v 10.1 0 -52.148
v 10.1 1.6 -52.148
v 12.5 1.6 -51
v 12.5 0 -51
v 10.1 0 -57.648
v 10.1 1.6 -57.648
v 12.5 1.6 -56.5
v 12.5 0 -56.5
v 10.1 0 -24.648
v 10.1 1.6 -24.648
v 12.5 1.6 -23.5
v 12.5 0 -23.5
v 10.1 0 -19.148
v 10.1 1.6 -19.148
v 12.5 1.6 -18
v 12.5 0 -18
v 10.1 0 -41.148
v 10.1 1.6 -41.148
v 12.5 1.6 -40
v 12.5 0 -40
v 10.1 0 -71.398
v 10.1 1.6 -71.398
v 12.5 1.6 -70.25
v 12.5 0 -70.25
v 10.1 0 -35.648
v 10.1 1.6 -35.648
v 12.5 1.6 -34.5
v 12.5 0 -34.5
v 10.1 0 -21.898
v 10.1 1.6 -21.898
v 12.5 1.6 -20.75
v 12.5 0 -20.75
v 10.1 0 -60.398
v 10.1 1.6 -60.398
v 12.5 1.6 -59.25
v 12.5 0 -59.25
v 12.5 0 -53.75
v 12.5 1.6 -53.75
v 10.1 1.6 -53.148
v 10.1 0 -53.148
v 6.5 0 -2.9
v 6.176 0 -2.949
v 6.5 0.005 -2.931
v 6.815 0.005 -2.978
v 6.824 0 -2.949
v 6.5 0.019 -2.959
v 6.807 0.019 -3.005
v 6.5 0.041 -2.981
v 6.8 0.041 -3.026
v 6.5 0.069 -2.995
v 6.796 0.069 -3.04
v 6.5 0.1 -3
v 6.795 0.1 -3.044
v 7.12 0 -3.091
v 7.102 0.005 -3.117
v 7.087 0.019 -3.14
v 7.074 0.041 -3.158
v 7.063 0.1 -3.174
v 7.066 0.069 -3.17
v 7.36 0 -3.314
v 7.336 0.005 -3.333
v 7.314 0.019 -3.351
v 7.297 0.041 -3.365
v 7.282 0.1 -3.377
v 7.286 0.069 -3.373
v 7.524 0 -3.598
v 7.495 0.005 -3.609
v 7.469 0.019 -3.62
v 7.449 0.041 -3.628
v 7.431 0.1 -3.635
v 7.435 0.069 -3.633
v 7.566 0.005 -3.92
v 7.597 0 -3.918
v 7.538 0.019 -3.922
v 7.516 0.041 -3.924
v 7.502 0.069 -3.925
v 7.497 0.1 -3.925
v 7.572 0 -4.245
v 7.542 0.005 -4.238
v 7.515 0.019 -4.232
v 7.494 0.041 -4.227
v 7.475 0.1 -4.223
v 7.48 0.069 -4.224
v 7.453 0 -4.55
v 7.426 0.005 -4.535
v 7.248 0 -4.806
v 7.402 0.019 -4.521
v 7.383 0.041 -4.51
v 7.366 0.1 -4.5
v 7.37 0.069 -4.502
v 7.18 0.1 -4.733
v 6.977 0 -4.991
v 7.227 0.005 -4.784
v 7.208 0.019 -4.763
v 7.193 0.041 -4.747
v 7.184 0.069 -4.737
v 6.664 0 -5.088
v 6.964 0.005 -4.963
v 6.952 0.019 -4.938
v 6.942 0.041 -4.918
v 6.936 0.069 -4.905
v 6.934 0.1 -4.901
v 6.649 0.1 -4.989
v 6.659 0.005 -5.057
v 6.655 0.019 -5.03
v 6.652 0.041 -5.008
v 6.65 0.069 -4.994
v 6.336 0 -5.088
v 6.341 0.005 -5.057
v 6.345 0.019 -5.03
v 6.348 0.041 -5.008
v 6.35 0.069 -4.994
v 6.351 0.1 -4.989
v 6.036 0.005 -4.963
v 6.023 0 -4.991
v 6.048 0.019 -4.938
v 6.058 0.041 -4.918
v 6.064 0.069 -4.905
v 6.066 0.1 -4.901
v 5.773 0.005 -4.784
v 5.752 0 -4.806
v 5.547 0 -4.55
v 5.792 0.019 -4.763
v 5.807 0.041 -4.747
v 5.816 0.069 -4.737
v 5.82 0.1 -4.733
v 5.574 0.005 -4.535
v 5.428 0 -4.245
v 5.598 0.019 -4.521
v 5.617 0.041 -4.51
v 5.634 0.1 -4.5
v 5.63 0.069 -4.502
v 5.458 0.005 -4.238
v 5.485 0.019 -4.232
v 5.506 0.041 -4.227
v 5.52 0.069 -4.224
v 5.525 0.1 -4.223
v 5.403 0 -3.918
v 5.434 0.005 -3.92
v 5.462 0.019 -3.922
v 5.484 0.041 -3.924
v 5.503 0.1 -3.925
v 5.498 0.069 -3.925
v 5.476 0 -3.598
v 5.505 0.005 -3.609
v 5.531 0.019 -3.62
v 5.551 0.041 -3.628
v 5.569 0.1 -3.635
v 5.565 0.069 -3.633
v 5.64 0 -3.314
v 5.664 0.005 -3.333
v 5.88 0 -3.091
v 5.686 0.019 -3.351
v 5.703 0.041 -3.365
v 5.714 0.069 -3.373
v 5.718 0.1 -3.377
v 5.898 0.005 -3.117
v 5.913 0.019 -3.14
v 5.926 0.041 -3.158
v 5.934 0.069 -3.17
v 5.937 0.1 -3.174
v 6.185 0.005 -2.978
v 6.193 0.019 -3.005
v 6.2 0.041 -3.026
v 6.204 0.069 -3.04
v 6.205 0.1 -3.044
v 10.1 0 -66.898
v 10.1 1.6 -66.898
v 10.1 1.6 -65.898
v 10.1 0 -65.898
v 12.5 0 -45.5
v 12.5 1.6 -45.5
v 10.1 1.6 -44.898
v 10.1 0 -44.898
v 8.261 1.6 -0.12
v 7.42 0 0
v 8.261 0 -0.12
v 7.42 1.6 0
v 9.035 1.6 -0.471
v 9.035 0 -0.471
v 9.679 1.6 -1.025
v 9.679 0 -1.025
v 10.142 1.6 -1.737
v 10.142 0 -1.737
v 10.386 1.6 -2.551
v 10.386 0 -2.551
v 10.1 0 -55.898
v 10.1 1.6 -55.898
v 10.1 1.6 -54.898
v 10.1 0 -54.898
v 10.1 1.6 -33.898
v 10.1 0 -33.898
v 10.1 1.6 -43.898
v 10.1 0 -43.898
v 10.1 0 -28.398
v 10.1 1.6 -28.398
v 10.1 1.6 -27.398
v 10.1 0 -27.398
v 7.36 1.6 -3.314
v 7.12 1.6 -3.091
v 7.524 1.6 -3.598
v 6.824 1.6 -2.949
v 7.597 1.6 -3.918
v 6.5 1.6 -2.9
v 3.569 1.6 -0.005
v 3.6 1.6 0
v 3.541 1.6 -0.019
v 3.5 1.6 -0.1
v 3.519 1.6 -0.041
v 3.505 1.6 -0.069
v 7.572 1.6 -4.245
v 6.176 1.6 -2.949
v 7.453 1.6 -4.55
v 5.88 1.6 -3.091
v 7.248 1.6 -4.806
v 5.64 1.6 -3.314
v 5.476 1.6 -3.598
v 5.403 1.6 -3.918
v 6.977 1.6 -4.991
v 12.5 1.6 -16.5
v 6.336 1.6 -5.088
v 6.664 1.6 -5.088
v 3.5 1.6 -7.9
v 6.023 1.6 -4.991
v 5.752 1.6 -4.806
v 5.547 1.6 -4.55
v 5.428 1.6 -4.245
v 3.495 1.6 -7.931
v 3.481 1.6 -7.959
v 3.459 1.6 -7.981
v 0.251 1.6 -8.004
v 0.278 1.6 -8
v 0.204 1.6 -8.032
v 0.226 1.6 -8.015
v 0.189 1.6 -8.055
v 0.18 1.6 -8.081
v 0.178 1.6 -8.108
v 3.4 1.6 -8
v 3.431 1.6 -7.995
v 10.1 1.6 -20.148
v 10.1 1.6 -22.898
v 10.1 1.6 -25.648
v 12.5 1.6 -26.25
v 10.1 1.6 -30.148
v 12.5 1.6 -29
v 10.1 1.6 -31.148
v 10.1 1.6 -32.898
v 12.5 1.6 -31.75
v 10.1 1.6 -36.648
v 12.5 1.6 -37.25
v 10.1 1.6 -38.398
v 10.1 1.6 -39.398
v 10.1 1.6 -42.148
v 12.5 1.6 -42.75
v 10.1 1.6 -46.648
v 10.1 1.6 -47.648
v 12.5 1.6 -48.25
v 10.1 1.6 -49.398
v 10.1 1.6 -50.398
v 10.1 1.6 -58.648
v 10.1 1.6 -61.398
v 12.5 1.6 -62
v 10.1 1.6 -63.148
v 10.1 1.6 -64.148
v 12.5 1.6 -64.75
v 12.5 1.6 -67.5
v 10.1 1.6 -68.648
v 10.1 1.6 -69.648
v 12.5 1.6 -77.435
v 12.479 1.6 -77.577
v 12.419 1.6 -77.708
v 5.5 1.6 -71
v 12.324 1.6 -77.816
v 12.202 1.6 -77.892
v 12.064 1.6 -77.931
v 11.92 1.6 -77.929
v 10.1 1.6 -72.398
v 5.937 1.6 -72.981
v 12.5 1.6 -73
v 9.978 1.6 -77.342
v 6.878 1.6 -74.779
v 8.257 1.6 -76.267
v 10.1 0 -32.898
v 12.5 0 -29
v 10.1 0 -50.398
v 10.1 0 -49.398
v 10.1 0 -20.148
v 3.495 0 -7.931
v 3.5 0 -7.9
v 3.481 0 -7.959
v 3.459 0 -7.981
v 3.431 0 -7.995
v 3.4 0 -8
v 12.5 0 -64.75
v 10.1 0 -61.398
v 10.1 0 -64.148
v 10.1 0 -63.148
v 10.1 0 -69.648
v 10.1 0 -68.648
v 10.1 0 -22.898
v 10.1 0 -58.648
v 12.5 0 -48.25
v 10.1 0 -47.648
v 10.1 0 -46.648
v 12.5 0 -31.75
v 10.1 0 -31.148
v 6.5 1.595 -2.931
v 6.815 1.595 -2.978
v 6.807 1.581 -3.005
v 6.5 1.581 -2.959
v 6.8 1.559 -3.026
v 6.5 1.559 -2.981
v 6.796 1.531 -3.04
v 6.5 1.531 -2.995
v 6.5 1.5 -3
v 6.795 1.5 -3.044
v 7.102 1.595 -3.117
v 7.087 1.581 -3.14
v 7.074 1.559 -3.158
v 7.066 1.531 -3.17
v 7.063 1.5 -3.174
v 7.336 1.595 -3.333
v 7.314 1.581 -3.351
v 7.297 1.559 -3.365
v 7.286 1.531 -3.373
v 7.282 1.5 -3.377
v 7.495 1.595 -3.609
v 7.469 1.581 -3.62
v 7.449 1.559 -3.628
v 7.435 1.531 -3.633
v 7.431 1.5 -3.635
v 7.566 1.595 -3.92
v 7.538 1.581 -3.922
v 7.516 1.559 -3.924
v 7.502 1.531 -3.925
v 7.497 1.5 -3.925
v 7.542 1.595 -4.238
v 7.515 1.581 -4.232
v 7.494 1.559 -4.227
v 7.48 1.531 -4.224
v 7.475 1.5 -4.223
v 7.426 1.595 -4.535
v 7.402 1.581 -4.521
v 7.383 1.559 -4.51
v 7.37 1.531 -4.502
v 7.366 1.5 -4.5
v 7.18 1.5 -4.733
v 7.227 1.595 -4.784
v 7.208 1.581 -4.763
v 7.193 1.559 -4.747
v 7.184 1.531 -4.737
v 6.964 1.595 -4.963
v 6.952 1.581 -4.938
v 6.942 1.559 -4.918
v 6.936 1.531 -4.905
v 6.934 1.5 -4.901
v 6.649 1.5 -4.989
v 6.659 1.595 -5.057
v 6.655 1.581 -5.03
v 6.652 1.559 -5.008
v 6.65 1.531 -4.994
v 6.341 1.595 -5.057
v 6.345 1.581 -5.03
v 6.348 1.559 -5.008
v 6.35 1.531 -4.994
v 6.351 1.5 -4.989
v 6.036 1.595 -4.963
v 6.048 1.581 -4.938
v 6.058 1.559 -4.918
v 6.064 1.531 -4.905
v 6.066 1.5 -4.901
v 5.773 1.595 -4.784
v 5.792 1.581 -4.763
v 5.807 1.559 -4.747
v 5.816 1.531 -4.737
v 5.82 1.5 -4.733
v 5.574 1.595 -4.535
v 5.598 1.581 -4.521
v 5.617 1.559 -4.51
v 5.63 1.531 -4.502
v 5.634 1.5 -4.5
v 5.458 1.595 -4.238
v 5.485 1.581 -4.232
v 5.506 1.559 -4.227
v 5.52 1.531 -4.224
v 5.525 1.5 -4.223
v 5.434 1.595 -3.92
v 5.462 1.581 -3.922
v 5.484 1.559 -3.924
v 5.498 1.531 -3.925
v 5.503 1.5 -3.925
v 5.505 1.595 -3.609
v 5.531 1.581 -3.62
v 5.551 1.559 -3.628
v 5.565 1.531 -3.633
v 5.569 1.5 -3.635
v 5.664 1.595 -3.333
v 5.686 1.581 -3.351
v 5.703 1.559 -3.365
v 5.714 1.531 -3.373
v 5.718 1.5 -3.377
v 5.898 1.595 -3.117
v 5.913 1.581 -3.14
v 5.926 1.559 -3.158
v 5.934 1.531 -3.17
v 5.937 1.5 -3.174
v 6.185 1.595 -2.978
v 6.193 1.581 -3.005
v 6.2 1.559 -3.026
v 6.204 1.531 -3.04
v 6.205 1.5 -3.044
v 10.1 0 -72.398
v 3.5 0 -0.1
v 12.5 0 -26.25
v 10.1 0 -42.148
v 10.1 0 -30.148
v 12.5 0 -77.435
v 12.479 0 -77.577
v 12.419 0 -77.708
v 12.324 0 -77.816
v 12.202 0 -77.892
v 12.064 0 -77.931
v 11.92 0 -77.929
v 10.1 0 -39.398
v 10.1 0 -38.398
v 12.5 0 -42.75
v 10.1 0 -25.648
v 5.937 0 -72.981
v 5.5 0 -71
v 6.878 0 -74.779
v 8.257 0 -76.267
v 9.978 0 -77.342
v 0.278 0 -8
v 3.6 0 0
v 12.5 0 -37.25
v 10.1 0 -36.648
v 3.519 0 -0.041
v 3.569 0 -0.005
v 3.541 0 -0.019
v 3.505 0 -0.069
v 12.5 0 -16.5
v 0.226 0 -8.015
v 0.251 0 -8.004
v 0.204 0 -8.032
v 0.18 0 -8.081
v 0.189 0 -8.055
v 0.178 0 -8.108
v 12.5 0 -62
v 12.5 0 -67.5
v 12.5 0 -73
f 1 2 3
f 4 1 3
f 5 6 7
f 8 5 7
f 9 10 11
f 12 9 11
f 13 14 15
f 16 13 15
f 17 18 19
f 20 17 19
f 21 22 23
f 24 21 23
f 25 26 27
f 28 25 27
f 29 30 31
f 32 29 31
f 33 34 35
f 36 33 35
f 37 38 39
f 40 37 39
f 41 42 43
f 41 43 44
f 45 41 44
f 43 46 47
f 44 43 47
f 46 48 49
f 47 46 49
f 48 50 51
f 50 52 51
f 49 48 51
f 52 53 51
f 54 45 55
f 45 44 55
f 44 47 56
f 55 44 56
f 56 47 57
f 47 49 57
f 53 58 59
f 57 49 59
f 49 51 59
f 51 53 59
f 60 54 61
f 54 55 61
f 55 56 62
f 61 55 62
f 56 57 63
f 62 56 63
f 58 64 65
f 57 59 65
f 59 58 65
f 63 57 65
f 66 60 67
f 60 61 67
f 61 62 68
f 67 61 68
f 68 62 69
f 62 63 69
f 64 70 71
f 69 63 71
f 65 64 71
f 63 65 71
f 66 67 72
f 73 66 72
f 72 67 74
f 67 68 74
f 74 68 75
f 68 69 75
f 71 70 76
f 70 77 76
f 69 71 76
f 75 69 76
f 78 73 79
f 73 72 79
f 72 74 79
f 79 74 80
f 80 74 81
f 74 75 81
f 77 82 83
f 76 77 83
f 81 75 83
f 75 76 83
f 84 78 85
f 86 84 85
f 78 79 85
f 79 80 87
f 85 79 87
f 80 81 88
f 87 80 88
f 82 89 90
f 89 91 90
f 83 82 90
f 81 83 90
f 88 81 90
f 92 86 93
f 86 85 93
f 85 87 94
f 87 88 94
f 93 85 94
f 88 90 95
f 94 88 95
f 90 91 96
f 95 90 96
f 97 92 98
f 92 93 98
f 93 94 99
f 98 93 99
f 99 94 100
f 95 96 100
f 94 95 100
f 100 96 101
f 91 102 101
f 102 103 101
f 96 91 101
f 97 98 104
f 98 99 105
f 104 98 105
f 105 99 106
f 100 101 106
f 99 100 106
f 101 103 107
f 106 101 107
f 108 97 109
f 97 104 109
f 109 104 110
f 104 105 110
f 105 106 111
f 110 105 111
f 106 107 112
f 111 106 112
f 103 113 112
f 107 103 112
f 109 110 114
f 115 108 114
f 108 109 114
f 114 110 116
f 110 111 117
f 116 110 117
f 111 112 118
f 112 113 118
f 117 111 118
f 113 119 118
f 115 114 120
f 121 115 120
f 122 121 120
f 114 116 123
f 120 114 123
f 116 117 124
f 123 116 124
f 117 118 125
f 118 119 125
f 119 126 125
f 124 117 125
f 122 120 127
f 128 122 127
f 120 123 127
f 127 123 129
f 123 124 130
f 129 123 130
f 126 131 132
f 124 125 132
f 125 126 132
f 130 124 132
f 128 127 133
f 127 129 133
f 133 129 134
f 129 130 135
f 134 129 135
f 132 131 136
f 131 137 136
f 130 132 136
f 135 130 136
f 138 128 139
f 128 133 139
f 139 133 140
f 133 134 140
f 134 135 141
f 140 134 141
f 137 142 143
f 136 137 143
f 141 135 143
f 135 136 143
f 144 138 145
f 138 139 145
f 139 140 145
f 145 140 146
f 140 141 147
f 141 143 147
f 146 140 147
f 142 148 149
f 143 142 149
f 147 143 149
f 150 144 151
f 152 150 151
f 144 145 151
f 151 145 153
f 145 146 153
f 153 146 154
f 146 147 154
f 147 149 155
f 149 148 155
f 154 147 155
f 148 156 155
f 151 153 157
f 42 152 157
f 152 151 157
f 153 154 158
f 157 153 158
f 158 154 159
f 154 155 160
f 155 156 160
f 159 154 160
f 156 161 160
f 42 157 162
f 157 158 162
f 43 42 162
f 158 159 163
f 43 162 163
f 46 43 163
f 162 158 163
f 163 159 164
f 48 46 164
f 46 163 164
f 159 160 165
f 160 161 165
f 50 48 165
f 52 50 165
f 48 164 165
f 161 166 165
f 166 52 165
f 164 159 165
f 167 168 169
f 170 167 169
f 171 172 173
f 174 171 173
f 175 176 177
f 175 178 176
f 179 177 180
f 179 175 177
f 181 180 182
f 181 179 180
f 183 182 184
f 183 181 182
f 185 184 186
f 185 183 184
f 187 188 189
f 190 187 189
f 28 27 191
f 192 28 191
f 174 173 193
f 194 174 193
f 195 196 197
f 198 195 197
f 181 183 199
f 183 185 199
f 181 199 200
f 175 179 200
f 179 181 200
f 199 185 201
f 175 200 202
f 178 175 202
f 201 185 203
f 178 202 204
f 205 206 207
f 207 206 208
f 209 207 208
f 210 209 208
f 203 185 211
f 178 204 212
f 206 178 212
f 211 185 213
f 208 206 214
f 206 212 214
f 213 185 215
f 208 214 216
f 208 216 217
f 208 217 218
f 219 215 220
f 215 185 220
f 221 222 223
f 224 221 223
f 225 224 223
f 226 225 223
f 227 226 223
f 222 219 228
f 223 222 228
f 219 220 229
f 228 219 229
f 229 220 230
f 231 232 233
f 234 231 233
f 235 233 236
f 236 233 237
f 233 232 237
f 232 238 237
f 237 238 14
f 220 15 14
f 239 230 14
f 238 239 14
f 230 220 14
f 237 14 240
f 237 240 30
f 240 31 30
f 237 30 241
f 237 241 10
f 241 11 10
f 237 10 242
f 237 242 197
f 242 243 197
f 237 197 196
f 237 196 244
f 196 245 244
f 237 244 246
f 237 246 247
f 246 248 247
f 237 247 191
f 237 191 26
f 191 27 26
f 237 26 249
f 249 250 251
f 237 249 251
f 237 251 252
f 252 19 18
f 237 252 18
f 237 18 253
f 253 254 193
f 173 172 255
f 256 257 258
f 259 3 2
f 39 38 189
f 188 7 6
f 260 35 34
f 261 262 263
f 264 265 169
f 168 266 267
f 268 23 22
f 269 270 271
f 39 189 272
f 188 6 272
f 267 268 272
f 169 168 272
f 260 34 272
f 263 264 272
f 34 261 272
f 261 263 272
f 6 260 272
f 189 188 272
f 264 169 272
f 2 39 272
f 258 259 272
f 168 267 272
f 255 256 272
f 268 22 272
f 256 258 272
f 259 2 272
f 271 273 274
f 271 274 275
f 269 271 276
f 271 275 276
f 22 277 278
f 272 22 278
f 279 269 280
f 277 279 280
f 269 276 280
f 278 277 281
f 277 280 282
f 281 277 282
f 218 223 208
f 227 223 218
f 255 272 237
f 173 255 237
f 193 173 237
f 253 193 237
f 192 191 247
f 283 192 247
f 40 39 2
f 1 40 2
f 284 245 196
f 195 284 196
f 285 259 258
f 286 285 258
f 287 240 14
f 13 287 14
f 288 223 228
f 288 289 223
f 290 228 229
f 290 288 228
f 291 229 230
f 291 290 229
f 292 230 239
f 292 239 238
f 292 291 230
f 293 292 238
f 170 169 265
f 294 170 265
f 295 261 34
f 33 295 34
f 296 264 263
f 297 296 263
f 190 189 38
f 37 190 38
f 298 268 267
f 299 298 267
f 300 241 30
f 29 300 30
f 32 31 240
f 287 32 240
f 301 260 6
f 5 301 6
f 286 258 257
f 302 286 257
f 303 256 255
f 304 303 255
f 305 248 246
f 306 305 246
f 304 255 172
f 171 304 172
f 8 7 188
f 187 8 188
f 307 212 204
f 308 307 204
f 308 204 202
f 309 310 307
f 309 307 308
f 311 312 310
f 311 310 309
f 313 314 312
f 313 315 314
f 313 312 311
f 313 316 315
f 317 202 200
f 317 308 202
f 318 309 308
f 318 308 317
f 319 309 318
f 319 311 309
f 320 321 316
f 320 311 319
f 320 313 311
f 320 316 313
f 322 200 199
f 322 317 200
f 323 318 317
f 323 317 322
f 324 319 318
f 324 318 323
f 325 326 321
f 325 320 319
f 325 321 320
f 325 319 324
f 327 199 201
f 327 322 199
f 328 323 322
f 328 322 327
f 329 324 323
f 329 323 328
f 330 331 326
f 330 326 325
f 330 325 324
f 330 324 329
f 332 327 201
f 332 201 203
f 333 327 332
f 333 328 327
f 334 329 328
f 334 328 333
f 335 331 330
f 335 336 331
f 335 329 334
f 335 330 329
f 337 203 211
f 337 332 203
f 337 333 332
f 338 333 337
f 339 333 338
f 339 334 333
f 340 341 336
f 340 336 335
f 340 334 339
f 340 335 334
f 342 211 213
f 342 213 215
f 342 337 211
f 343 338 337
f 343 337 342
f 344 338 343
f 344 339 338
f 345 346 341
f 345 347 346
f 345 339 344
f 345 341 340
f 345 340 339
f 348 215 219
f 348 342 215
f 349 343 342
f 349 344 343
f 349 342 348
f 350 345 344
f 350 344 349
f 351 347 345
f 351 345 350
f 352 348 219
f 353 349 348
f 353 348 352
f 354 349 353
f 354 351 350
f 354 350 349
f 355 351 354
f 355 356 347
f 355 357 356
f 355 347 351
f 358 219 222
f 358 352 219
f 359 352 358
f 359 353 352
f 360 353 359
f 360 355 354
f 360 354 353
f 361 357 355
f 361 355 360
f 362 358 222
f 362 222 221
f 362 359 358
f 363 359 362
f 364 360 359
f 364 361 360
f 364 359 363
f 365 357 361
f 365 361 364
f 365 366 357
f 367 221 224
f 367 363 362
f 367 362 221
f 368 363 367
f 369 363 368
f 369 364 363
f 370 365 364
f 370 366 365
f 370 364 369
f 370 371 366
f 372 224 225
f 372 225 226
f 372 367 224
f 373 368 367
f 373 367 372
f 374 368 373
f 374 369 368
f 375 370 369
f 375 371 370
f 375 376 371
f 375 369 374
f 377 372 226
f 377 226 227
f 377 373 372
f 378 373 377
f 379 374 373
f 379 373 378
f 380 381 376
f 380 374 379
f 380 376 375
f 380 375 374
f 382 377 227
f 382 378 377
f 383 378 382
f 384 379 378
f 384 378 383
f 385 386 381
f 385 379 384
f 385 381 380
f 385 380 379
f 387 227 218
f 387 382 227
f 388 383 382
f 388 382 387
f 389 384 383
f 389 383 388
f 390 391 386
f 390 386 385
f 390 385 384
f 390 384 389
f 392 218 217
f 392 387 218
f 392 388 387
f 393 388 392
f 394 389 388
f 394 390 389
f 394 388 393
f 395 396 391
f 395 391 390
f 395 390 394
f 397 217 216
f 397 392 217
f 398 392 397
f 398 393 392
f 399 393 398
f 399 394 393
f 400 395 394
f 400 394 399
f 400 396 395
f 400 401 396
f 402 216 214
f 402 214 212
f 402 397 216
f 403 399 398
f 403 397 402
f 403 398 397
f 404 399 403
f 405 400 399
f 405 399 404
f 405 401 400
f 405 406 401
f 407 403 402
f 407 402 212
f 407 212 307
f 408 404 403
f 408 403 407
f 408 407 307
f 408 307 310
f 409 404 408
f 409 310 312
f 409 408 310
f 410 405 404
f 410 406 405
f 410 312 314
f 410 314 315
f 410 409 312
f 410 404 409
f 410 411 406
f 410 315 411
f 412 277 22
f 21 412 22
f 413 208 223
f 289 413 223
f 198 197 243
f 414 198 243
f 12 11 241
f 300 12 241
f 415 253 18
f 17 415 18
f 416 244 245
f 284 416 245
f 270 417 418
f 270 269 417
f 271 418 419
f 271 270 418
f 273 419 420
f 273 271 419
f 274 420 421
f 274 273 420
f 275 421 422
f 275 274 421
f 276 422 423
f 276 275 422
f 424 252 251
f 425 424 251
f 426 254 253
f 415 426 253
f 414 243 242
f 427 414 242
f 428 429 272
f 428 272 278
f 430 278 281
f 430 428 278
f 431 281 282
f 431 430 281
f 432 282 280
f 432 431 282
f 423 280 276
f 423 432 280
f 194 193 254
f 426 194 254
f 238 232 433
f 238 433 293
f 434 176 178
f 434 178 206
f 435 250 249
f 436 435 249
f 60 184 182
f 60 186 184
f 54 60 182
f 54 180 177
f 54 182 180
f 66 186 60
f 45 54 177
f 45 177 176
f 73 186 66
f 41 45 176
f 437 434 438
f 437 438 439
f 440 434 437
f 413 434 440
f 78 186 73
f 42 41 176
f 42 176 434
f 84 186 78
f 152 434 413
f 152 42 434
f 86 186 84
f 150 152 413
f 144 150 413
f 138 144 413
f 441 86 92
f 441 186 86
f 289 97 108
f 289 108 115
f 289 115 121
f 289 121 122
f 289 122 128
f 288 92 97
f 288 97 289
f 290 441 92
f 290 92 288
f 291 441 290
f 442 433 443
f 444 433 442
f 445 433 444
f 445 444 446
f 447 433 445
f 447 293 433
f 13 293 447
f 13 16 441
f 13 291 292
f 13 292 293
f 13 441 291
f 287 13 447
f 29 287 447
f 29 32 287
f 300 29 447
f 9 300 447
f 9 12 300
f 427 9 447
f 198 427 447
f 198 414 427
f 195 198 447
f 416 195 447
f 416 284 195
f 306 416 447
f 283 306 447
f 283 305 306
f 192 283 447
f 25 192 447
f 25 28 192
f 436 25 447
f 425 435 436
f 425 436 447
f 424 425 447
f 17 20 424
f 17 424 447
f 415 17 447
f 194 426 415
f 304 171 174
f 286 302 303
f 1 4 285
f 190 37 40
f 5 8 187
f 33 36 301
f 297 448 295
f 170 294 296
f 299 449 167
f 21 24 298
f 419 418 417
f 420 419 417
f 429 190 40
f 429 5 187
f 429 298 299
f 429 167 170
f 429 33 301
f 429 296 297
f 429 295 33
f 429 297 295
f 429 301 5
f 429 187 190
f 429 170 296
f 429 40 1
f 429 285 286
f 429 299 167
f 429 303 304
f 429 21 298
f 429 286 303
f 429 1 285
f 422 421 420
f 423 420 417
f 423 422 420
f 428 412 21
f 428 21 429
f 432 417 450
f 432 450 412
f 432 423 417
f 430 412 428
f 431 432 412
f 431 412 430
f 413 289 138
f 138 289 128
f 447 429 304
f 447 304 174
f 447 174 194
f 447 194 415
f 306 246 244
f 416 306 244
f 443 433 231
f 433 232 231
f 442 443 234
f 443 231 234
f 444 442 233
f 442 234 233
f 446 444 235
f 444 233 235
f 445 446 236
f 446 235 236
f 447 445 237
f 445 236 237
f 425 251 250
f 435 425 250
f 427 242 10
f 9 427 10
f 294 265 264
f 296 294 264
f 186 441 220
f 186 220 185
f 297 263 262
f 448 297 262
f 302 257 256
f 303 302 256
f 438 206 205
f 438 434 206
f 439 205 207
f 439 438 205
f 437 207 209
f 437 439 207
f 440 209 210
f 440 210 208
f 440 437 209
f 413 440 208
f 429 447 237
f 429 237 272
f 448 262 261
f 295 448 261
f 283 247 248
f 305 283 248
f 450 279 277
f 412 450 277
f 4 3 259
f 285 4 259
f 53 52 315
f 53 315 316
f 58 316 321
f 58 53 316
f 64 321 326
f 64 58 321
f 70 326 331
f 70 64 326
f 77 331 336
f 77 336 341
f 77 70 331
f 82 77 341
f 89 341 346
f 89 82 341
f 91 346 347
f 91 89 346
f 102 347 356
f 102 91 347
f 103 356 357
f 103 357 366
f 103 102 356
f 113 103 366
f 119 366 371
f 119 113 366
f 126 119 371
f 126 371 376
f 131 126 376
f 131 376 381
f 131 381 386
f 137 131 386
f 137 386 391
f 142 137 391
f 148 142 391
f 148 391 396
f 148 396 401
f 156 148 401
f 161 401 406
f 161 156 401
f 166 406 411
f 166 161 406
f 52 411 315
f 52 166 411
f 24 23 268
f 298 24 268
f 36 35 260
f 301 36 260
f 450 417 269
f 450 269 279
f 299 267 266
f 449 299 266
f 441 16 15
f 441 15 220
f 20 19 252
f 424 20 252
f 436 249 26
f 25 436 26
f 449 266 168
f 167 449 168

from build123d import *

# Parameters (mm, degrees)
SKETCH1_R           = 1
BOSS_EXTRUDE2_DEPTH = 1.6
SKETCH3_W           = 3.5
SKETCH3_H           = 8
CUT_EXTRUDE2_DEPTH  = 80.011454866
FILLET2_R           = 3
FILLET3_R           = 0.1
FILLET4_R           = 0.1
CUT_EXTRUDE3_DEPTH  = 80.011454866
LPATTERN7_COUNT     = 20
LPATTERN7_PITCH     = 2.75
FILLET5_R           = 0.5


with BuildPart() as part:
    # Sketch1 → Boss-Extrude2 (new body)
    with BuildSketch(Plane(origin=(0, 0, 0), x_dir=(1, 0, 0), z_dir=(0, 1, 0))):
        with BuildLine():
            Line((0, 0), (0, 6))
            Line((0, 6), (5.5, 71))
            ThreePointArc((5.5, 71), (7.72044875, 75.77955125), (12.5, 78))
            Line((12.5, 78), (12.5, 16.5))
            Line((12.5, 16.5), (10, 0))
            Line((10, 0), (0, 0))
        make_face()
        with Locations(Location((6.5, 4, 0), (0, 0, 270))):
            Circle(SKETCH1_R, mode=Mode.SUBTRACT)
    extrude(amount=BOSS_EXTRUDE2_DEPTH)

    # Sketch3 → Cut-Extrude2 (cut, through all)
    with BuildSketch(Plane(origin=(0, 1.6, 0), x_dir=(1, 0, 0), z_dir=(0, 1, 0))):
        with Locations((1.75, 4)):
            Rectangle(SKETCH3_W, SKETCH3_H)
    extrude(amount=-CUT_EXTRUDE2_DEPTH, mode=Mode.SUBTRACT)

    # Fillet2
    fillet2_edges = [part.edges().sort_by_distance(p)[0] for p in [
        (10, 0.8, 0),
    ]]
    fillet(fillet2_edges, radius=FILLET2_R)

    # Fillet3
    fillet3_edges = [part.edges().sort_by_distance(p)[0] for p in [
        (6.5, 0, -5),
        (6.5, 1.6, -5),
    ]]
    fillet(fillet3_edges, radius=FILLET3_R)

    # Fillet4
    fillet4_edges = [part.edges().sort_by_distance(p)[0] for p in [
        (0.169230769, 0.8, -8),
        (3.5, 0.8, -8),
        (3.5, 0.8, 0),
    ]]
    fillet(fillet4_edges, radius=FILLET4_R)

    # Sketch4 → Cut-Extrude3 (cut, through all)
    with BuildSketch(Plane(origin=(0, 1.6, 0), x_dir=(1, 0, 0), z_dir=(0, 1, 0))):
        Polygon((12.5, 73), (10.1, 72.398256348), (10.1, 71.398256348), (12.5, 70.25), align=None)
    cut_extrude3 = extrude(amount=-CUT_EXTRUDE3_DEPTH, mode=Mode.SUBTRACT)

    # LPattern7: Cut-Extrude3 ×20
    with Locations(*[(0, 0, i * LPATTERN7_PITCH) for i in range(1, LPATTERN7_COUNT)]):
        add(cut_extrude3, mode=Mode.SUBTRACT)

    # Fillet5
    fillet5_edges = [part.edges().sort_by_distance(p)[0] for p in [
        (12.5, 0.8, -78),
    ]]
    fillet(fillet5_edges, radius=FILLET5_R)


solid = part.part
